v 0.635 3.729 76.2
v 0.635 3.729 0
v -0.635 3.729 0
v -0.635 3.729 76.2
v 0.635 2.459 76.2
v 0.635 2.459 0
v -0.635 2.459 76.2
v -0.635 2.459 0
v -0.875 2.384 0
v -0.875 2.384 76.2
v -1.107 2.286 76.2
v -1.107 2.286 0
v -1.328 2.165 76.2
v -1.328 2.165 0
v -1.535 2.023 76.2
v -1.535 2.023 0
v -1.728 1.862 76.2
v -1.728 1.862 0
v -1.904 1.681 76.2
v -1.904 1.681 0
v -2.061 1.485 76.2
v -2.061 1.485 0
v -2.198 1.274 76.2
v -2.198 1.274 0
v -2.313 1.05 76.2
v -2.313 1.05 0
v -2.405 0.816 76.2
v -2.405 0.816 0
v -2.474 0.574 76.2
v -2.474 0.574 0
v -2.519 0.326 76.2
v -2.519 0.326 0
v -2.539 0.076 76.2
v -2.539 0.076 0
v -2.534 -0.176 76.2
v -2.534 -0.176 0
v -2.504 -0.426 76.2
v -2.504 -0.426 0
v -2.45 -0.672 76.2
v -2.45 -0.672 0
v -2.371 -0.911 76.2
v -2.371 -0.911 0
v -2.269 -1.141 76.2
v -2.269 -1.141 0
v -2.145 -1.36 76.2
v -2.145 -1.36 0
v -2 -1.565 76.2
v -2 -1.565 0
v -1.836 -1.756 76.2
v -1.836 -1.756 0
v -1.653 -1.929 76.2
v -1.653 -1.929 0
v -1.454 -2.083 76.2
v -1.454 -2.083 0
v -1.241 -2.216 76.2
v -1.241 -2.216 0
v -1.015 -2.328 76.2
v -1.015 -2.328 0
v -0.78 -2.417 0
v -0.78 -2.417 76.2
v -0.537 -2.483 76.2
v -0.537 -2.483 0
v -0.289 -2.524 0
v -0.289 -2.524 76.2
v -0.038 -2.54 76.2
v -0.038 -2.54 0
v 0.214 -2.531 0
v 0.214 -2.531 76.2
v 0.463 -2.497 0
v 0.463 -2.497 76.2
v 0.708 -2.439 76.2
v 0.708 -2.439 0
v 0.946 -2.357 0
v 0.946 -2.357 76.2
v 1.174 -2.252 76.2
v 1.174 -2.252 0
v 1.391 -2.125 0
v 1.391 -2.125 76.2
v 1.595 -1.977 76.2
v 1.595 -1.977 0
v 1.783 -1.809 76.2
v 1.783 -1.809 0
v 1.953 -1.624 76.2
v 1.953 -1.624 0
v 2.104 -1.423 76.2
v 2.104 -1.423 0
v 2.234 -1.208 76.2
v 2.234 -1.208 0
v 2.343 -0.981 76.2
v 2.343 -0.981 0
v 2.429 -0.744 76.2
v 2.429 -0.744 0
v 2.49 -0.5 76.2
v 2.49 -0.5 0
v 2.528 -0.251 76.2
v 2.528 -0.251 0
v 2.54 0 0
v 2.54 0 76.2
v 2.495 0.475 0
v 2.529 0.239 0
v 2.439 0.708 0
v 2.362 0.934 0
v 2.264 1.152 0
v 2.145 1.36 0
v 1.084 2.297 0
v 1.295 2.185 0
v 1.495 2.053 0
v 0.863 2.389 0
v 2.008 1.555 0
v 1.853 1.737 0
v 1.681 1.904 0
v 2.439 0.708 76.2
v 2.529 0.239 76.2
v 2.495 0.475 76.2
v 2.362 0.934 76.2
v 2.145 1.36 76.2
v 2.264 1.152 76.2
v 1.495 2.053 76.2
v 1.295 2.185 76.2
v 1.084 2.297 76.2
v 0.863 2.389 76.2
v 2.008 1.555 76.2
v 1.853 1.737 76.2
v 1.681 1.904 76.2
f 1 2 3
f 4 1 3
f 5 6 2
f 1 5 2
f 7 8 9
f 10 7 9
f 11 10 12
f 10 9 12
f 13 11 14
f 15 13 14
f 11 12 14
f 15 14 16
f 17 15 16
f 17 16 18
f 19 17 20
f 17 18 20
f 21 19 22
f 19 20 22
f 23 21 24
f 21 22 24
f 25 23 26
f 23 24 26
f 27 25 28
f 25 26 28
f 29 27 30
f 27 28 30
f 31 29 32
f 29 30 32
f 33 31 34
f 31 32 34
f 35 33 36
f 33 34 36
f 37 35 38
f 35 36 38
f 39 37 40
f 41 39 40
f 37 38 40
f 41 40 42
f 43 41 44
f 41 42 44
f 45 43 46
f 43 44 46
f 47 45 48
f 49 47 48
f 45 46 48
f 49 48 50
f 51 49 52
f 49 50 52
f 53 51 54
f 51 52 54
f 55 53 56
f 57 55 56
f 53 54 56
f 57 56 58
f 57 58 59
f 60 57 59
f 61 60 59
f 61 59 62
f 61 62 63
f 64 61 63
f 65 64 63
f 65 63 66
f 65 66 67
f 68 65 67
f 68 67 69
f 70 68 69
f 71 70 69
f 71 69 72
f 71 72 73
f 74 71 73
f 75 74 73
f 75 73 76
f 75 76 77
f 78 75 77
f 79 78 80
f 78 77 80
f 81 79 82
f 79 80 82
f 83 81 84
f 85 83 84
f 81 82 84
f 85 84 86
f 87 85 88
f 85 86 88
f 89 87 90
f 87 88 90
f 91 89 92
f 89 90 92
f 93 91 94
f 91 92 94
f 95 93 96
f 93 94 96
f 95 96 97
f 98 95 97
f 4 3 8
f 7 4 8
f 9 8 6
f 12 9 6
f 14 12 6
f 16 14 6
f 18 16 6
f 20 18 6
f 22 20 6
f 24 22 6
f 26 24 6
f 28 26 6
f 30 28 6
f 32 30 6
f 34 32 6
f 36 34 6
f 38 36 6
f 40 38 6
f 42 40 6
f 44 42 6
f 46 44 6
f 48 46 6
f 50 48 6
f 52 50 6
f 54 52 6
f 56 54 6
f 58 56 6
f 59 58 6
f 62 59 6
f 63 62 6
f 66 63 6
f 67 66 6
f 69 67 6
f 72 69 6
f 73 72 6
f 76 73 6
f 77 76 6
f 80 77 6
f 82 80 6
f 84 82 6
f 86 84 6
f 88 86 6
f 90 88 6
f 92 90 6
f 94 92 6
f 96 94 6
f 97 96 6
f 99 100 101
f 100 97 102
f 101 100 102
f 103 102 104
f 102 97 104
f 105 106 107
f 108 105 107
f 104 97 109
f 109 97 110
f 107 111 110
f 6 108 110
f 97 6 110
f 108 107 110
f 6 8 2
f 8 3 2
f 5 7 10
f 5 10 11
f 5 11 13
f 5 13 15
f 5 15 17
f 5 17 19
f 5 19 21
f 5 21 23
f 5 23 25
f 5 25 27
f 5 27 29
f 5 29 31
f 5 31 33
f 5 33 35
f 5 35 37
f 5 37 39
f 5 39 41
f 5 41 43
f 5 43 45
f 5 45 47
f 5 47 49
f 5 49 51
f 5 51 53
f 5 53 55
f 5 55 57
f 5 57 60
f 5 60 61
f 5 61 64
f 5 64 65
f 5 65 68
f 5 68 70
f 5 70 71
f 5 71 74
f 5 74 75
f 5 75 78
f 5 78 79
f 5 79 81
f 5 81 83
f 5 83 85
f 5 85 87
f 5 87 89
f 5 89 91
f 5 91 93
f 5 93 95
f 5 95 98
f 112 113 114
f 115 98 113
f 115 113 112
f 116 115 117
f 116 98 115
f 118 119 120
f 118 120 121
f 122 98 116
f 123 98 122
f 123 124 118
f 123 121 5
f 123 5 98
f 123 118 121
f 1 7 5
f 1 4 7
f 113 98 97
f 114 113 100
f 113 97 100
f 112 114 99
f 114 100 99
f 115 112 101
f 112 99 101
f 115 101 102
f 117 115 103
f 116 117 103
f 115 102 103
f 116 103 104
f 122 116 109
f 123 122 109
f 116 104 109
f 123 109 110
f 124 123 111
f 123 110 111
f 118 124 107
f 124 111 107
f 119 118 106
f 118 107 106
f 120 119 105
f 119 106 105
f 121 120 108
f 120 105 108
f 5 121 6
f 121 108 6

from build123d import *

# Parameters (mm, degrees)
F1_DEPTH = 76.2


with BuildPart() as f1:
    # F0 (on Top) → F1 (new body)
    with BuildSketch(Plane.XY):
        with BuildLine():
            ThreePointArc((-0.635, 2.4593444248), (-1.5554259867, -2.0080463142), (2.54, 0))
            ThreePointArc((2.54, 0), (2.0080463142, 1.5554259867), (0.635, 2.4593444248))
            Line((0.635, 2.4593444248), (-0.635, 2.4593444248))
        make_face()
        with BuildLine():
            Line((-0.635, 2.4593444248), (0.635, 2.4593444248))
            ThreePointArc((0.635, 2.4593444248), (0, 2.54), (-0.635, 2.4593444248))
        make_face()
        with BuildLine():
            ThreePointArc((-0.635, 2.4593444248), (0, 2.54), (0.635, 2.4593444248))
            Line((0.635, 2.4593444248), (0.635, 3.7293444248))
            Line((0.635, 3.7293444248), (-0.635, 3.7293444248))
            Line((-0.635, 3.7293444248), (-0.635, 2.4593444248))
        make_face()
    extrude(amount=F1_DEPTH)


solid = f1.part
